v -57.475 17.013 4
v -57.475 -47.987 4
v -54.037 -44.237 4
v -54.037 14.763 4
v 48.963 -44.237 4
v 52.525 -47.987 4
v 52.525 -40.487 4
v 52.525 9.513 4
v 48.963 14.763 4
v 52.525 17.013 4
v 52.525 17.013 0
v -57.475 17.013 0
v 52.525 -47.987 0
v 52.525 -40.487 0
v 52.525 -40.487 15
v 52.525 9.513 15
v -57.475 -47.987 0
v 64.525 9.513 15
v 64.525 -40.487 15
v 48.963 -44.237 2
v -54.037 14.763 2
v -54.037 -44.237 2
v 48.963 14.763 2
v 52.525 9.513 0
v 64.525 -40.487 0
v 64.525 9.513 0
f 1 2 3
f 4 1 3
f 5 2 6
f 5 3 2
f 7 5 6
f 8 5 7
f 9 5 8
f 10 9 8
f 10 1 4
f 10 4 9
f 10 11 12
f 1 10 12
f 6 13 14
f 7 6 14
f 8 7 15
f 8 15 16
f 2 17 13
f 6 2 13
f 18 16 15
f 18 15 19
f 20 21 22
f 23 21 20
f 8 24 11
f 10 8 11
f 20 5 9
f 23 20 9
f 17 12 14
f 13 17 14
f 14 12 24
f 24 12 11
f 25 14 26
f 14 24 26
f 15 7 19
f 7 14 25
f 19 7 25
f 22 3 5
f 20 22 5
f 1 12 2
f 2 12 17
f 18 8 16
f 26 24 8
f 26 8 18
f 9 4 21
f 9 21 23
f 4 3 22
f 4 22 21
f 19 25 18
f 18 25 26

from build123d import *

# Parameters (mm, degrees)
F0_W     = 12
F0_H     = 50
F1_DEPTH = 4
F2_W     = 103
F2_H     = 59
F3_DEPTH = 8
F4_DEPTH = 15
F5_DEPTH = 2


with BuildPart() as f1:
    # F0 (on Top) → F1 (new body)
    with BuildSketch(Plane.XY):
        Polygon((-39.061178, 17.013159), (-57.475254, 17.013159), (-57.475254, -47.986841), (52.524746, -47.986841), (52.524746, -40.486841), (52.524746, 9.513159), (52.524746, 17.013159), (10.938822, 17.013159), align=None)
        with Locations((58.524746, -15.486841)):
            Rectangle(F0_W, F0_H)
    extrude(amount=F1_DEPTH)

    # F2 (on face) → F3 (cut)
    with BuildSketch(Plane.XY.offset(4)):
        with Locations((-2.536587, -14.736841)):
            Rectangle(F2_W, F2_H)
    extrude(amount=-F3_DEPTH, mode=Mode.SUBTRACT)

    # F0 (on Top) → F4 (join)
    with BuildSketch(Plane.XY):
        with Locations((58.524746, -15.486841)):
            Rectangle(F0_W, F0_H)
    extrude(amount=F4_DEPTH)

    # F0 (on Top) → F5 (join)
    with BuildSketch(Plane.XY):
        Polygon((-39.061178, 17.013159), (-57.475254, 17.013159), (-57.475254, -47.986841), (52.524746, -47.986841), (52.524746, -40.486841), (52.524746, 9.513159), (52.524746, 17.013159), (10.938822, 17.013159), align=None)
    extrude(amount=F5_DEPTH)


solid = f1.part
